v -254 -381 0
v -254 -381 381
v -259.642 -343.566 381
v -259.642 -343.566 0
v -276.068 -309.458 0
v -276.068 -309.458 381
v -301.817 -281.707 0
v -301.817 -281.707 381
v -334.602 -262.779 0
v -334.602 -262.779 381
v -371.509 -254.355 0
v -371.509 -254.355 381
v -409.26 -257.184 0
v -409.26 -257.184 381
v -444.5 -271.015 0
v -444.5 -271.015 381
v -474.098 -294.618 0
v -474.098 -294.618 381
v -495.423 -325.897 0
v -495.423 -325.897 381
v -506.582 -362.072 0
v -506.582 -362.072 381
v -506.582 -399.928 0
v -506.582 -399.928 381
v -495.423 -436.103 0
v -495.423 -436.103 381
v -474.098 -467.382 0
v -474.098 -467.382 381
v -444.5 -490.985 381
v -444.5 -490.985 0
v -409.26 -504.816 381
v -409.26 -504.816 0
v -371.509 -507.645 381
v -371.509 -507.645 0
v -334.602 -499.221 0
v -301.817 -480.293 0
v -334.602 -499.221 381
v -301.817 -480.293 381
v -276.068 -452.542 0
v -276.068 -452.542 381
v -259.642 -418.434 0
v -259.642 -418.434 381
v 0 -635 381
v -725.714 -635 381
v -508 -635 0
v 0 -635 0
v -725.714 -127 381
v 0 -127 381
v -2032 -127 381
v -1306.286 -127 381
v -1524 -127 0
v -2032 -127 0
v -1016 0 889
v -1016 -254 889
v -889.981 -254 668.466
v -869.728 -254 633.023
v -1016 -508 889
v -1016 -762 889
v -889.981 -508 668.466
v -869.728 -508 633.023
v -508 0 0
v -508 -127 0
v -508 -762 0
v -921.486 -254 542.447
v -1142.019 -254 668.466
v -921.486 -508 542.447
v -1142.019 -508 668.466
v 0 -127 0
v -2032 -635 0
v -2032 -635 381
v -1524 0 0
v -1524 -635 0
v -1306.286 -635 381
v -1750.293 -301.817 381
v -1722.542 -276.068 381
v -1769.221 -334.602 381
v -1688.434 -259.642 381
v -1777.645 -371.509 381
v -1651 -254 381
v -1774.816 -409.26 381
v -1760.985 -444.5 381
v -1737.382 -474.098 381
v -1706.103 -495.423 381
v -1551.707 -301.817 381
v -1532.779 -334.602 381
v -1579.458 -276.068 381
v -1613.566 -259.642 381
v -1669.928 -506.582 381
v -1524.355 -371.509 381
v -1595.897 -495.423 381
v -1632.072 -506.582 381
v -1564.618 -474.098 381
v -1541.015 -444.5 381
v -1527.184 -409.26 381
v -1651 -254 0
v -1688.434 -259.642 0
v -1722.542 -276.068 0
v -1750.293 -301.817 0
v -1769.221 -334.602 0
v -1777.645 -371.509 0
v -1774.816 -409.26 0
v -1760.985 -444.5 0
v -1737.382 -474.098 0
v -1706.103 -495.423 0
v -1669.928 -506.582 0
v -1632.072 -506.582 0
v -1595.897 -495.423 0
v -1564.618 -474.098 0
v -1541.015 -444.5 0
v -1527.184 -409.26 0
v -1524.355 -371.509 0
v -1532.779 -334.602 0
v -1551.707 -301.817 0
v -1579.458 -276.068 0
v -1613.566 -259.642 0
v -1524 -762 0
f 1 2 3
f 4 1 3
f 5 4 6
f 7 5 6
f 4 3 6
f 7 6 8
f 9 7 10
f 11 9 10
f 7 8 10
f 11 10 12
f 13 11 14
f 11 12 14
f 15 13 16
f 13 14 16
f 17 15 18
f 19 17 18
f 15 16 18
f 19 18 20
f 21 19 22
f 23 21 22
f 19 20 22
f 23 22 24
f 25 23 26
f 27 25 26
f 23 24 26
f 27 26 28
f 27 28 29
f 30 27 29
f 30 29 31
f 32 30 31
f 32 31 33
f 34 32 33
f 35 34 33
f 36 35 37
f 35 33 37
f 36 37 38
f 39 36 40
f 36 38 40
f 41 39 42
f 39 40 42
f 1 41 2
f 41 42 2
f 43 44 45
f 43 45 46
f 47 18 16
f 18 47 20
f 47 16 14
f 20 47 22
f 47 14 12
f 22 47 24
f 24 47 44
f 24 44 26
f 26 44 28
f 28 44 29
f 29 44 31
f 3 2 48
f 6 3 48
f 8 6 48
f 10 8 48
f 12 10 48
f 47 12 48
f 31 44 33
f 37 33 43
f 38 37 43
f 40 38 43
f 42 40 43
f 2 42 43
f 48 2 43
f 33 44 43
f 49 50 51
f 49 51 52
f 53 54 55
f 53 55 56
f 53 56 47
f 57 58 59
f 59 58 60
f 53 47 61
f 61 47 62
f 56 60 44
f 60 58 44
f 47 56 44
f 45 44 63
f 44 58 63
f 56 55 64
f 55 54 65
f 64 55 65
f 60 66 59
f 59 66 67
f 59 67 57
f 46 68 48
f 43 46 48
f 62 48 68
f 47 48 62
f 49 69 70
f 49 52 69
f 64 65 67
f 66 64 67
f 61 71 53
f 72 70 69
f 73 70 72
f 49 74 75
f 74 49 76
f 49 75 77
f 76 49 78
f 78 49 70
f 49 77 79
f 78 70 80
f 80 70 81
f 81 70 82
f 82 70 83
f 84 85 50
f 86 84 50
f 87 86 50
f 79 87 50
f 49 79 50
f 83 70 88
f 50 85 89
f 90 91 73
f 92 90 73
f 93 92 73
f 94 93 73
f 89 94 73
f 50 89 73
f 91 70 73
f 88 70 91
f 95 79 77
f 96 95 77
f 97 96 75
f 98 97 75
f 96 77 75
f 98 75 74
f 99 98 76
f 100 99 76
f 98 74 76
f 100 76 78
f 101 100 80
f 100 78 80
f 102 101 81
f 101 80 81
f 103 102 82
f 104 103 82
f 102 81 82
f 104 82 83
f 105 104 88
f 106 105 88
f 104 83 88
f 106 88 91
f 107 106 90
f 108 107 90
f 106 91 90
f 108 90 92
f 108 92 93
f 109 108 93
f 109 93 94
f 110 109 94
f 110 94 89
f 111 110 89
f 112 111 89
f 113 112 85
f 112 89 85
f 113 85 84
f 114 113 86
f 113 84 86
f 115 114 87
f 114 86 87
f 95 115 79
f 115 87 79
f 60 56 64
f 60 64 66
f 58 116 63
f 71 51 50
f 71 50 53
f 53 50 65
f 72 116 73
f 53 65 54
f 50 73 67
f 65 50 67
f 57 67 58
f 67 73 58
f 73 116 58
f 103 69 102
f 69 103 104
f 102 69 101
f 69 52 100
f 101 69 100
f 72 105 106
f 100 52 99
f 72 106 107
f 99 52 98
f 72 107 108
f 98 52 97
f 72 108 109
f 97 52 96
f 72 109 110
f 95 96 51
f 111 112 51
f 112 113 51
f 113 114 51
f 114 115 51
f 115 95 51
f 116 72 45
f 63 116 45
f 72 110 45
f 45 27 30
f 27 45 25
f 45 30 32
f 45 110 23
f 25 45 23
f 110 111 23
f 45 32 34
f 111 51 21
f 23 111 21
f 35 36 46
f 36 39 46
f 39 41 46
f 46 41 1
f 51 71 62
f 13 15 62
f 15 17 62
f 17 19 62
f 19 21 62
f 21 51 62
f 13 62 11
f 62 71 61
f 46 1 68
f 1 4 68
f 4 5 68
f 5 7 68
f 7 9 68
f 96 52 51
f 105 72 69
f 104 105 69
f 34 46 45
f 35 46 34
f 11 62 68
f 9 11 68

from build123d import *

# Parameters (mm, degrees)
F0_W      = 2032
F0_H      = 889
F1_DEPTH  = 762
F3_DEPTH  = 127
F5_DEPTH  = 762
F7_DEPTH  = 889
F9_DEPTH  = 762
F11_DEPTH = 127
F12_W     = 254
F12_H     = 254
F13_DEPTH = 254
F15_DEPTH = 381
F17_DEPTH = 381
F18_R     = 127
F19_DEPTH = 381
F20_R     = 127
F21_DEPTH = 381
F22_R     = 127
F23_DEPTH = 381
F24_W     = 254
F24_H     = 254
F25_DEPTH = 254


with BuildPart() as f1:
    # F0 (on Front) → F1 (new body)
    with BuildSketch(Plane.XZ):
        with Locations((-1016, 444.5)):
            Rectangle(F0_W, F0_H)
    extrude(amount=F1_DEPTH)

    # F2 (on face) → F3 (cut)
    with BuildSketch(Plane.XZ.offset(762)):
        Polygon((-725.7142857143, 381), (-508, 0), (0, 0), (0, 381), align=None)
        Polygon((-2032, 381), (-2032, 0), (-1524, 0), (-1306.2857142857, 381), align=None)
    extrude(amount=-F3_DEPTH, mode=Mode.SUBTRACT)

    # F4 (on face) → F5 (join)
    with BuildSketch(Plane.XZ.offset(762)):
        Polygon((-2032, 381), (-1306.2857142857, 381), (-1016, 889), (-2032, 889), align=None)
        Polygon((0, 889), (-1016, 889), (-725.7142857143, 381), (0, 381), align=None)
    extrude(amount=-F5_DEPTH)

    # F6 (on face) → F7 (cut)
    with BuildSketch(Plane.XZ.offset(762)):
        Polygon((-2032, 381), (-1306.2857142857, 381), (-1016, 889), (-2032, 889), align=None)
    extrude(amount=-F7_DEPTH, mode=Mode.SUBTRACT)

    # F8 (on face) → F9 (cut)
    with BuildSketch(Plane.XZ.offset(762)):
        Polygon((-1016, 889), (-725.7142857143, 381), (0, 381), (0, 889), align=None)
    extrude(amount=-F9_DEPTH, mode=Mode.SUBTRACT)

    # F10 (on face) → F11 (cut)
    with BuildSketch(Plane(origin=(0, 0, 0), x_dir=(-1, 0, 0), z_dir=(0, 1, 0))):
        Polygon((0, 381), (0, 0), (508, 0), (725.7142857143, 381), align=None)
        Polygon((1306.2857142857, 381), (1524, 0), (2032, 0), (2032, 381), align=None)
    extrude(amount=-F11_DEPTH, mode=Mode.SUBTRACT)

    # F12 (on face) → F13 (cut)
    with BuildSketch(Plane(origin=(-382.9538461538, 0, -218.8307692308), x_dir=(0, 1, 0), z_dir=(0.8682431421, 0, 0.4961389384))):
        with Locations((-381, 1148.9453147192)):
            Rectangle(F12_W, F12_H)
    extrude(amount=F13_DEPTH, mode=Mode.SUBTRACT)

    # F14 (on face) → F15 (cut)
    with BuildSketch(Plane.XY.offset(381)):
        with BuildLine():
            ThreePointArc((-1524, -381), (-1561.1974387893, -291.1974387893), (-1651, -254))
            Line((-1651, -254), (-1651, -381))
            Line((-1651, -381), (-1778, -381))
            ThreePointArc((-1778, -381), (-1651, -508), (-1524, -381))
        make_face()
        with BuildLine():
            Line((-1651, -381), (-1651, -254))
            ThreePointArc((-1651, -254), (-1740.8025612107, -291.1974387893), (-1778, -381))
            Line((-1778, -381), (-1651, -381))
        make_face()
    extrude(amount=-F15_DEPTH, mode=Mode.SUBTRACT)

    # F16 (on face) → F17 (join)
    with BuildSketch(Plane.XY.offset(381)):
        with BuildLine():
            ThreePointArc((-254, -381), (-291.1974387893, -291.1974387893), (-381, -254))
            Line((-381, -254), (-381, -381))
            Line((-381, -381), (-254, -381))
        make_face()
        with BuildLine():
            Line((-381, -381), (-381, -254))
            ThreePointArc((-381, -254), (-470.8025612107, -470.8025612107), (-254, -381))
            Line((-254, -381), (-381, -381))
        make_face()
    extrude(amount=-F17_DEPTH)

    # F18 (on face) → F19 (join)
    with BuildSketch(Plane.XY.offset(381)):
        with Locations((-381, -381)):
            Circle(F18_R)
    extrude(amount=-F19_DEPTH)

    # F20 (on face) → F21 (cut)
    with BuildSketch(Plane.XY.offset(381)):
        with Locations((-381, -381)):
            Circle(F20_R)
    extrude(amount=F21_DEPTH, mode=Mode.SUBTRACT)

    # F22 (on face) → F23 (cut)
    with BuildSketch(Plane.XY.offset(381)):
        with Locations((-381, -381)):
            Circle(F22_R)
    extrude(amount=-F23_DEPTH, mode=Mode.SUBTRACT)

    # F24 (on face) → F25 (cut)
    with BuildSketch(Plane(origin=(-1148.8615384615, 0, 656.4923076923), x_dir=(0, -1, 0), z_dir=(-0.8682431421, 0, 0.4961389384))):
        with Locations((381, 140.7909919781)):
            Rectangle(F24_W, F24_H)
        with Locations((381, 394.7909919781)):
            Rectangle(F24_W, F24_H)
    extrude(amount=-F25_DEPTH, mode=Mode.SUBTRACT)


solid = f1.part
